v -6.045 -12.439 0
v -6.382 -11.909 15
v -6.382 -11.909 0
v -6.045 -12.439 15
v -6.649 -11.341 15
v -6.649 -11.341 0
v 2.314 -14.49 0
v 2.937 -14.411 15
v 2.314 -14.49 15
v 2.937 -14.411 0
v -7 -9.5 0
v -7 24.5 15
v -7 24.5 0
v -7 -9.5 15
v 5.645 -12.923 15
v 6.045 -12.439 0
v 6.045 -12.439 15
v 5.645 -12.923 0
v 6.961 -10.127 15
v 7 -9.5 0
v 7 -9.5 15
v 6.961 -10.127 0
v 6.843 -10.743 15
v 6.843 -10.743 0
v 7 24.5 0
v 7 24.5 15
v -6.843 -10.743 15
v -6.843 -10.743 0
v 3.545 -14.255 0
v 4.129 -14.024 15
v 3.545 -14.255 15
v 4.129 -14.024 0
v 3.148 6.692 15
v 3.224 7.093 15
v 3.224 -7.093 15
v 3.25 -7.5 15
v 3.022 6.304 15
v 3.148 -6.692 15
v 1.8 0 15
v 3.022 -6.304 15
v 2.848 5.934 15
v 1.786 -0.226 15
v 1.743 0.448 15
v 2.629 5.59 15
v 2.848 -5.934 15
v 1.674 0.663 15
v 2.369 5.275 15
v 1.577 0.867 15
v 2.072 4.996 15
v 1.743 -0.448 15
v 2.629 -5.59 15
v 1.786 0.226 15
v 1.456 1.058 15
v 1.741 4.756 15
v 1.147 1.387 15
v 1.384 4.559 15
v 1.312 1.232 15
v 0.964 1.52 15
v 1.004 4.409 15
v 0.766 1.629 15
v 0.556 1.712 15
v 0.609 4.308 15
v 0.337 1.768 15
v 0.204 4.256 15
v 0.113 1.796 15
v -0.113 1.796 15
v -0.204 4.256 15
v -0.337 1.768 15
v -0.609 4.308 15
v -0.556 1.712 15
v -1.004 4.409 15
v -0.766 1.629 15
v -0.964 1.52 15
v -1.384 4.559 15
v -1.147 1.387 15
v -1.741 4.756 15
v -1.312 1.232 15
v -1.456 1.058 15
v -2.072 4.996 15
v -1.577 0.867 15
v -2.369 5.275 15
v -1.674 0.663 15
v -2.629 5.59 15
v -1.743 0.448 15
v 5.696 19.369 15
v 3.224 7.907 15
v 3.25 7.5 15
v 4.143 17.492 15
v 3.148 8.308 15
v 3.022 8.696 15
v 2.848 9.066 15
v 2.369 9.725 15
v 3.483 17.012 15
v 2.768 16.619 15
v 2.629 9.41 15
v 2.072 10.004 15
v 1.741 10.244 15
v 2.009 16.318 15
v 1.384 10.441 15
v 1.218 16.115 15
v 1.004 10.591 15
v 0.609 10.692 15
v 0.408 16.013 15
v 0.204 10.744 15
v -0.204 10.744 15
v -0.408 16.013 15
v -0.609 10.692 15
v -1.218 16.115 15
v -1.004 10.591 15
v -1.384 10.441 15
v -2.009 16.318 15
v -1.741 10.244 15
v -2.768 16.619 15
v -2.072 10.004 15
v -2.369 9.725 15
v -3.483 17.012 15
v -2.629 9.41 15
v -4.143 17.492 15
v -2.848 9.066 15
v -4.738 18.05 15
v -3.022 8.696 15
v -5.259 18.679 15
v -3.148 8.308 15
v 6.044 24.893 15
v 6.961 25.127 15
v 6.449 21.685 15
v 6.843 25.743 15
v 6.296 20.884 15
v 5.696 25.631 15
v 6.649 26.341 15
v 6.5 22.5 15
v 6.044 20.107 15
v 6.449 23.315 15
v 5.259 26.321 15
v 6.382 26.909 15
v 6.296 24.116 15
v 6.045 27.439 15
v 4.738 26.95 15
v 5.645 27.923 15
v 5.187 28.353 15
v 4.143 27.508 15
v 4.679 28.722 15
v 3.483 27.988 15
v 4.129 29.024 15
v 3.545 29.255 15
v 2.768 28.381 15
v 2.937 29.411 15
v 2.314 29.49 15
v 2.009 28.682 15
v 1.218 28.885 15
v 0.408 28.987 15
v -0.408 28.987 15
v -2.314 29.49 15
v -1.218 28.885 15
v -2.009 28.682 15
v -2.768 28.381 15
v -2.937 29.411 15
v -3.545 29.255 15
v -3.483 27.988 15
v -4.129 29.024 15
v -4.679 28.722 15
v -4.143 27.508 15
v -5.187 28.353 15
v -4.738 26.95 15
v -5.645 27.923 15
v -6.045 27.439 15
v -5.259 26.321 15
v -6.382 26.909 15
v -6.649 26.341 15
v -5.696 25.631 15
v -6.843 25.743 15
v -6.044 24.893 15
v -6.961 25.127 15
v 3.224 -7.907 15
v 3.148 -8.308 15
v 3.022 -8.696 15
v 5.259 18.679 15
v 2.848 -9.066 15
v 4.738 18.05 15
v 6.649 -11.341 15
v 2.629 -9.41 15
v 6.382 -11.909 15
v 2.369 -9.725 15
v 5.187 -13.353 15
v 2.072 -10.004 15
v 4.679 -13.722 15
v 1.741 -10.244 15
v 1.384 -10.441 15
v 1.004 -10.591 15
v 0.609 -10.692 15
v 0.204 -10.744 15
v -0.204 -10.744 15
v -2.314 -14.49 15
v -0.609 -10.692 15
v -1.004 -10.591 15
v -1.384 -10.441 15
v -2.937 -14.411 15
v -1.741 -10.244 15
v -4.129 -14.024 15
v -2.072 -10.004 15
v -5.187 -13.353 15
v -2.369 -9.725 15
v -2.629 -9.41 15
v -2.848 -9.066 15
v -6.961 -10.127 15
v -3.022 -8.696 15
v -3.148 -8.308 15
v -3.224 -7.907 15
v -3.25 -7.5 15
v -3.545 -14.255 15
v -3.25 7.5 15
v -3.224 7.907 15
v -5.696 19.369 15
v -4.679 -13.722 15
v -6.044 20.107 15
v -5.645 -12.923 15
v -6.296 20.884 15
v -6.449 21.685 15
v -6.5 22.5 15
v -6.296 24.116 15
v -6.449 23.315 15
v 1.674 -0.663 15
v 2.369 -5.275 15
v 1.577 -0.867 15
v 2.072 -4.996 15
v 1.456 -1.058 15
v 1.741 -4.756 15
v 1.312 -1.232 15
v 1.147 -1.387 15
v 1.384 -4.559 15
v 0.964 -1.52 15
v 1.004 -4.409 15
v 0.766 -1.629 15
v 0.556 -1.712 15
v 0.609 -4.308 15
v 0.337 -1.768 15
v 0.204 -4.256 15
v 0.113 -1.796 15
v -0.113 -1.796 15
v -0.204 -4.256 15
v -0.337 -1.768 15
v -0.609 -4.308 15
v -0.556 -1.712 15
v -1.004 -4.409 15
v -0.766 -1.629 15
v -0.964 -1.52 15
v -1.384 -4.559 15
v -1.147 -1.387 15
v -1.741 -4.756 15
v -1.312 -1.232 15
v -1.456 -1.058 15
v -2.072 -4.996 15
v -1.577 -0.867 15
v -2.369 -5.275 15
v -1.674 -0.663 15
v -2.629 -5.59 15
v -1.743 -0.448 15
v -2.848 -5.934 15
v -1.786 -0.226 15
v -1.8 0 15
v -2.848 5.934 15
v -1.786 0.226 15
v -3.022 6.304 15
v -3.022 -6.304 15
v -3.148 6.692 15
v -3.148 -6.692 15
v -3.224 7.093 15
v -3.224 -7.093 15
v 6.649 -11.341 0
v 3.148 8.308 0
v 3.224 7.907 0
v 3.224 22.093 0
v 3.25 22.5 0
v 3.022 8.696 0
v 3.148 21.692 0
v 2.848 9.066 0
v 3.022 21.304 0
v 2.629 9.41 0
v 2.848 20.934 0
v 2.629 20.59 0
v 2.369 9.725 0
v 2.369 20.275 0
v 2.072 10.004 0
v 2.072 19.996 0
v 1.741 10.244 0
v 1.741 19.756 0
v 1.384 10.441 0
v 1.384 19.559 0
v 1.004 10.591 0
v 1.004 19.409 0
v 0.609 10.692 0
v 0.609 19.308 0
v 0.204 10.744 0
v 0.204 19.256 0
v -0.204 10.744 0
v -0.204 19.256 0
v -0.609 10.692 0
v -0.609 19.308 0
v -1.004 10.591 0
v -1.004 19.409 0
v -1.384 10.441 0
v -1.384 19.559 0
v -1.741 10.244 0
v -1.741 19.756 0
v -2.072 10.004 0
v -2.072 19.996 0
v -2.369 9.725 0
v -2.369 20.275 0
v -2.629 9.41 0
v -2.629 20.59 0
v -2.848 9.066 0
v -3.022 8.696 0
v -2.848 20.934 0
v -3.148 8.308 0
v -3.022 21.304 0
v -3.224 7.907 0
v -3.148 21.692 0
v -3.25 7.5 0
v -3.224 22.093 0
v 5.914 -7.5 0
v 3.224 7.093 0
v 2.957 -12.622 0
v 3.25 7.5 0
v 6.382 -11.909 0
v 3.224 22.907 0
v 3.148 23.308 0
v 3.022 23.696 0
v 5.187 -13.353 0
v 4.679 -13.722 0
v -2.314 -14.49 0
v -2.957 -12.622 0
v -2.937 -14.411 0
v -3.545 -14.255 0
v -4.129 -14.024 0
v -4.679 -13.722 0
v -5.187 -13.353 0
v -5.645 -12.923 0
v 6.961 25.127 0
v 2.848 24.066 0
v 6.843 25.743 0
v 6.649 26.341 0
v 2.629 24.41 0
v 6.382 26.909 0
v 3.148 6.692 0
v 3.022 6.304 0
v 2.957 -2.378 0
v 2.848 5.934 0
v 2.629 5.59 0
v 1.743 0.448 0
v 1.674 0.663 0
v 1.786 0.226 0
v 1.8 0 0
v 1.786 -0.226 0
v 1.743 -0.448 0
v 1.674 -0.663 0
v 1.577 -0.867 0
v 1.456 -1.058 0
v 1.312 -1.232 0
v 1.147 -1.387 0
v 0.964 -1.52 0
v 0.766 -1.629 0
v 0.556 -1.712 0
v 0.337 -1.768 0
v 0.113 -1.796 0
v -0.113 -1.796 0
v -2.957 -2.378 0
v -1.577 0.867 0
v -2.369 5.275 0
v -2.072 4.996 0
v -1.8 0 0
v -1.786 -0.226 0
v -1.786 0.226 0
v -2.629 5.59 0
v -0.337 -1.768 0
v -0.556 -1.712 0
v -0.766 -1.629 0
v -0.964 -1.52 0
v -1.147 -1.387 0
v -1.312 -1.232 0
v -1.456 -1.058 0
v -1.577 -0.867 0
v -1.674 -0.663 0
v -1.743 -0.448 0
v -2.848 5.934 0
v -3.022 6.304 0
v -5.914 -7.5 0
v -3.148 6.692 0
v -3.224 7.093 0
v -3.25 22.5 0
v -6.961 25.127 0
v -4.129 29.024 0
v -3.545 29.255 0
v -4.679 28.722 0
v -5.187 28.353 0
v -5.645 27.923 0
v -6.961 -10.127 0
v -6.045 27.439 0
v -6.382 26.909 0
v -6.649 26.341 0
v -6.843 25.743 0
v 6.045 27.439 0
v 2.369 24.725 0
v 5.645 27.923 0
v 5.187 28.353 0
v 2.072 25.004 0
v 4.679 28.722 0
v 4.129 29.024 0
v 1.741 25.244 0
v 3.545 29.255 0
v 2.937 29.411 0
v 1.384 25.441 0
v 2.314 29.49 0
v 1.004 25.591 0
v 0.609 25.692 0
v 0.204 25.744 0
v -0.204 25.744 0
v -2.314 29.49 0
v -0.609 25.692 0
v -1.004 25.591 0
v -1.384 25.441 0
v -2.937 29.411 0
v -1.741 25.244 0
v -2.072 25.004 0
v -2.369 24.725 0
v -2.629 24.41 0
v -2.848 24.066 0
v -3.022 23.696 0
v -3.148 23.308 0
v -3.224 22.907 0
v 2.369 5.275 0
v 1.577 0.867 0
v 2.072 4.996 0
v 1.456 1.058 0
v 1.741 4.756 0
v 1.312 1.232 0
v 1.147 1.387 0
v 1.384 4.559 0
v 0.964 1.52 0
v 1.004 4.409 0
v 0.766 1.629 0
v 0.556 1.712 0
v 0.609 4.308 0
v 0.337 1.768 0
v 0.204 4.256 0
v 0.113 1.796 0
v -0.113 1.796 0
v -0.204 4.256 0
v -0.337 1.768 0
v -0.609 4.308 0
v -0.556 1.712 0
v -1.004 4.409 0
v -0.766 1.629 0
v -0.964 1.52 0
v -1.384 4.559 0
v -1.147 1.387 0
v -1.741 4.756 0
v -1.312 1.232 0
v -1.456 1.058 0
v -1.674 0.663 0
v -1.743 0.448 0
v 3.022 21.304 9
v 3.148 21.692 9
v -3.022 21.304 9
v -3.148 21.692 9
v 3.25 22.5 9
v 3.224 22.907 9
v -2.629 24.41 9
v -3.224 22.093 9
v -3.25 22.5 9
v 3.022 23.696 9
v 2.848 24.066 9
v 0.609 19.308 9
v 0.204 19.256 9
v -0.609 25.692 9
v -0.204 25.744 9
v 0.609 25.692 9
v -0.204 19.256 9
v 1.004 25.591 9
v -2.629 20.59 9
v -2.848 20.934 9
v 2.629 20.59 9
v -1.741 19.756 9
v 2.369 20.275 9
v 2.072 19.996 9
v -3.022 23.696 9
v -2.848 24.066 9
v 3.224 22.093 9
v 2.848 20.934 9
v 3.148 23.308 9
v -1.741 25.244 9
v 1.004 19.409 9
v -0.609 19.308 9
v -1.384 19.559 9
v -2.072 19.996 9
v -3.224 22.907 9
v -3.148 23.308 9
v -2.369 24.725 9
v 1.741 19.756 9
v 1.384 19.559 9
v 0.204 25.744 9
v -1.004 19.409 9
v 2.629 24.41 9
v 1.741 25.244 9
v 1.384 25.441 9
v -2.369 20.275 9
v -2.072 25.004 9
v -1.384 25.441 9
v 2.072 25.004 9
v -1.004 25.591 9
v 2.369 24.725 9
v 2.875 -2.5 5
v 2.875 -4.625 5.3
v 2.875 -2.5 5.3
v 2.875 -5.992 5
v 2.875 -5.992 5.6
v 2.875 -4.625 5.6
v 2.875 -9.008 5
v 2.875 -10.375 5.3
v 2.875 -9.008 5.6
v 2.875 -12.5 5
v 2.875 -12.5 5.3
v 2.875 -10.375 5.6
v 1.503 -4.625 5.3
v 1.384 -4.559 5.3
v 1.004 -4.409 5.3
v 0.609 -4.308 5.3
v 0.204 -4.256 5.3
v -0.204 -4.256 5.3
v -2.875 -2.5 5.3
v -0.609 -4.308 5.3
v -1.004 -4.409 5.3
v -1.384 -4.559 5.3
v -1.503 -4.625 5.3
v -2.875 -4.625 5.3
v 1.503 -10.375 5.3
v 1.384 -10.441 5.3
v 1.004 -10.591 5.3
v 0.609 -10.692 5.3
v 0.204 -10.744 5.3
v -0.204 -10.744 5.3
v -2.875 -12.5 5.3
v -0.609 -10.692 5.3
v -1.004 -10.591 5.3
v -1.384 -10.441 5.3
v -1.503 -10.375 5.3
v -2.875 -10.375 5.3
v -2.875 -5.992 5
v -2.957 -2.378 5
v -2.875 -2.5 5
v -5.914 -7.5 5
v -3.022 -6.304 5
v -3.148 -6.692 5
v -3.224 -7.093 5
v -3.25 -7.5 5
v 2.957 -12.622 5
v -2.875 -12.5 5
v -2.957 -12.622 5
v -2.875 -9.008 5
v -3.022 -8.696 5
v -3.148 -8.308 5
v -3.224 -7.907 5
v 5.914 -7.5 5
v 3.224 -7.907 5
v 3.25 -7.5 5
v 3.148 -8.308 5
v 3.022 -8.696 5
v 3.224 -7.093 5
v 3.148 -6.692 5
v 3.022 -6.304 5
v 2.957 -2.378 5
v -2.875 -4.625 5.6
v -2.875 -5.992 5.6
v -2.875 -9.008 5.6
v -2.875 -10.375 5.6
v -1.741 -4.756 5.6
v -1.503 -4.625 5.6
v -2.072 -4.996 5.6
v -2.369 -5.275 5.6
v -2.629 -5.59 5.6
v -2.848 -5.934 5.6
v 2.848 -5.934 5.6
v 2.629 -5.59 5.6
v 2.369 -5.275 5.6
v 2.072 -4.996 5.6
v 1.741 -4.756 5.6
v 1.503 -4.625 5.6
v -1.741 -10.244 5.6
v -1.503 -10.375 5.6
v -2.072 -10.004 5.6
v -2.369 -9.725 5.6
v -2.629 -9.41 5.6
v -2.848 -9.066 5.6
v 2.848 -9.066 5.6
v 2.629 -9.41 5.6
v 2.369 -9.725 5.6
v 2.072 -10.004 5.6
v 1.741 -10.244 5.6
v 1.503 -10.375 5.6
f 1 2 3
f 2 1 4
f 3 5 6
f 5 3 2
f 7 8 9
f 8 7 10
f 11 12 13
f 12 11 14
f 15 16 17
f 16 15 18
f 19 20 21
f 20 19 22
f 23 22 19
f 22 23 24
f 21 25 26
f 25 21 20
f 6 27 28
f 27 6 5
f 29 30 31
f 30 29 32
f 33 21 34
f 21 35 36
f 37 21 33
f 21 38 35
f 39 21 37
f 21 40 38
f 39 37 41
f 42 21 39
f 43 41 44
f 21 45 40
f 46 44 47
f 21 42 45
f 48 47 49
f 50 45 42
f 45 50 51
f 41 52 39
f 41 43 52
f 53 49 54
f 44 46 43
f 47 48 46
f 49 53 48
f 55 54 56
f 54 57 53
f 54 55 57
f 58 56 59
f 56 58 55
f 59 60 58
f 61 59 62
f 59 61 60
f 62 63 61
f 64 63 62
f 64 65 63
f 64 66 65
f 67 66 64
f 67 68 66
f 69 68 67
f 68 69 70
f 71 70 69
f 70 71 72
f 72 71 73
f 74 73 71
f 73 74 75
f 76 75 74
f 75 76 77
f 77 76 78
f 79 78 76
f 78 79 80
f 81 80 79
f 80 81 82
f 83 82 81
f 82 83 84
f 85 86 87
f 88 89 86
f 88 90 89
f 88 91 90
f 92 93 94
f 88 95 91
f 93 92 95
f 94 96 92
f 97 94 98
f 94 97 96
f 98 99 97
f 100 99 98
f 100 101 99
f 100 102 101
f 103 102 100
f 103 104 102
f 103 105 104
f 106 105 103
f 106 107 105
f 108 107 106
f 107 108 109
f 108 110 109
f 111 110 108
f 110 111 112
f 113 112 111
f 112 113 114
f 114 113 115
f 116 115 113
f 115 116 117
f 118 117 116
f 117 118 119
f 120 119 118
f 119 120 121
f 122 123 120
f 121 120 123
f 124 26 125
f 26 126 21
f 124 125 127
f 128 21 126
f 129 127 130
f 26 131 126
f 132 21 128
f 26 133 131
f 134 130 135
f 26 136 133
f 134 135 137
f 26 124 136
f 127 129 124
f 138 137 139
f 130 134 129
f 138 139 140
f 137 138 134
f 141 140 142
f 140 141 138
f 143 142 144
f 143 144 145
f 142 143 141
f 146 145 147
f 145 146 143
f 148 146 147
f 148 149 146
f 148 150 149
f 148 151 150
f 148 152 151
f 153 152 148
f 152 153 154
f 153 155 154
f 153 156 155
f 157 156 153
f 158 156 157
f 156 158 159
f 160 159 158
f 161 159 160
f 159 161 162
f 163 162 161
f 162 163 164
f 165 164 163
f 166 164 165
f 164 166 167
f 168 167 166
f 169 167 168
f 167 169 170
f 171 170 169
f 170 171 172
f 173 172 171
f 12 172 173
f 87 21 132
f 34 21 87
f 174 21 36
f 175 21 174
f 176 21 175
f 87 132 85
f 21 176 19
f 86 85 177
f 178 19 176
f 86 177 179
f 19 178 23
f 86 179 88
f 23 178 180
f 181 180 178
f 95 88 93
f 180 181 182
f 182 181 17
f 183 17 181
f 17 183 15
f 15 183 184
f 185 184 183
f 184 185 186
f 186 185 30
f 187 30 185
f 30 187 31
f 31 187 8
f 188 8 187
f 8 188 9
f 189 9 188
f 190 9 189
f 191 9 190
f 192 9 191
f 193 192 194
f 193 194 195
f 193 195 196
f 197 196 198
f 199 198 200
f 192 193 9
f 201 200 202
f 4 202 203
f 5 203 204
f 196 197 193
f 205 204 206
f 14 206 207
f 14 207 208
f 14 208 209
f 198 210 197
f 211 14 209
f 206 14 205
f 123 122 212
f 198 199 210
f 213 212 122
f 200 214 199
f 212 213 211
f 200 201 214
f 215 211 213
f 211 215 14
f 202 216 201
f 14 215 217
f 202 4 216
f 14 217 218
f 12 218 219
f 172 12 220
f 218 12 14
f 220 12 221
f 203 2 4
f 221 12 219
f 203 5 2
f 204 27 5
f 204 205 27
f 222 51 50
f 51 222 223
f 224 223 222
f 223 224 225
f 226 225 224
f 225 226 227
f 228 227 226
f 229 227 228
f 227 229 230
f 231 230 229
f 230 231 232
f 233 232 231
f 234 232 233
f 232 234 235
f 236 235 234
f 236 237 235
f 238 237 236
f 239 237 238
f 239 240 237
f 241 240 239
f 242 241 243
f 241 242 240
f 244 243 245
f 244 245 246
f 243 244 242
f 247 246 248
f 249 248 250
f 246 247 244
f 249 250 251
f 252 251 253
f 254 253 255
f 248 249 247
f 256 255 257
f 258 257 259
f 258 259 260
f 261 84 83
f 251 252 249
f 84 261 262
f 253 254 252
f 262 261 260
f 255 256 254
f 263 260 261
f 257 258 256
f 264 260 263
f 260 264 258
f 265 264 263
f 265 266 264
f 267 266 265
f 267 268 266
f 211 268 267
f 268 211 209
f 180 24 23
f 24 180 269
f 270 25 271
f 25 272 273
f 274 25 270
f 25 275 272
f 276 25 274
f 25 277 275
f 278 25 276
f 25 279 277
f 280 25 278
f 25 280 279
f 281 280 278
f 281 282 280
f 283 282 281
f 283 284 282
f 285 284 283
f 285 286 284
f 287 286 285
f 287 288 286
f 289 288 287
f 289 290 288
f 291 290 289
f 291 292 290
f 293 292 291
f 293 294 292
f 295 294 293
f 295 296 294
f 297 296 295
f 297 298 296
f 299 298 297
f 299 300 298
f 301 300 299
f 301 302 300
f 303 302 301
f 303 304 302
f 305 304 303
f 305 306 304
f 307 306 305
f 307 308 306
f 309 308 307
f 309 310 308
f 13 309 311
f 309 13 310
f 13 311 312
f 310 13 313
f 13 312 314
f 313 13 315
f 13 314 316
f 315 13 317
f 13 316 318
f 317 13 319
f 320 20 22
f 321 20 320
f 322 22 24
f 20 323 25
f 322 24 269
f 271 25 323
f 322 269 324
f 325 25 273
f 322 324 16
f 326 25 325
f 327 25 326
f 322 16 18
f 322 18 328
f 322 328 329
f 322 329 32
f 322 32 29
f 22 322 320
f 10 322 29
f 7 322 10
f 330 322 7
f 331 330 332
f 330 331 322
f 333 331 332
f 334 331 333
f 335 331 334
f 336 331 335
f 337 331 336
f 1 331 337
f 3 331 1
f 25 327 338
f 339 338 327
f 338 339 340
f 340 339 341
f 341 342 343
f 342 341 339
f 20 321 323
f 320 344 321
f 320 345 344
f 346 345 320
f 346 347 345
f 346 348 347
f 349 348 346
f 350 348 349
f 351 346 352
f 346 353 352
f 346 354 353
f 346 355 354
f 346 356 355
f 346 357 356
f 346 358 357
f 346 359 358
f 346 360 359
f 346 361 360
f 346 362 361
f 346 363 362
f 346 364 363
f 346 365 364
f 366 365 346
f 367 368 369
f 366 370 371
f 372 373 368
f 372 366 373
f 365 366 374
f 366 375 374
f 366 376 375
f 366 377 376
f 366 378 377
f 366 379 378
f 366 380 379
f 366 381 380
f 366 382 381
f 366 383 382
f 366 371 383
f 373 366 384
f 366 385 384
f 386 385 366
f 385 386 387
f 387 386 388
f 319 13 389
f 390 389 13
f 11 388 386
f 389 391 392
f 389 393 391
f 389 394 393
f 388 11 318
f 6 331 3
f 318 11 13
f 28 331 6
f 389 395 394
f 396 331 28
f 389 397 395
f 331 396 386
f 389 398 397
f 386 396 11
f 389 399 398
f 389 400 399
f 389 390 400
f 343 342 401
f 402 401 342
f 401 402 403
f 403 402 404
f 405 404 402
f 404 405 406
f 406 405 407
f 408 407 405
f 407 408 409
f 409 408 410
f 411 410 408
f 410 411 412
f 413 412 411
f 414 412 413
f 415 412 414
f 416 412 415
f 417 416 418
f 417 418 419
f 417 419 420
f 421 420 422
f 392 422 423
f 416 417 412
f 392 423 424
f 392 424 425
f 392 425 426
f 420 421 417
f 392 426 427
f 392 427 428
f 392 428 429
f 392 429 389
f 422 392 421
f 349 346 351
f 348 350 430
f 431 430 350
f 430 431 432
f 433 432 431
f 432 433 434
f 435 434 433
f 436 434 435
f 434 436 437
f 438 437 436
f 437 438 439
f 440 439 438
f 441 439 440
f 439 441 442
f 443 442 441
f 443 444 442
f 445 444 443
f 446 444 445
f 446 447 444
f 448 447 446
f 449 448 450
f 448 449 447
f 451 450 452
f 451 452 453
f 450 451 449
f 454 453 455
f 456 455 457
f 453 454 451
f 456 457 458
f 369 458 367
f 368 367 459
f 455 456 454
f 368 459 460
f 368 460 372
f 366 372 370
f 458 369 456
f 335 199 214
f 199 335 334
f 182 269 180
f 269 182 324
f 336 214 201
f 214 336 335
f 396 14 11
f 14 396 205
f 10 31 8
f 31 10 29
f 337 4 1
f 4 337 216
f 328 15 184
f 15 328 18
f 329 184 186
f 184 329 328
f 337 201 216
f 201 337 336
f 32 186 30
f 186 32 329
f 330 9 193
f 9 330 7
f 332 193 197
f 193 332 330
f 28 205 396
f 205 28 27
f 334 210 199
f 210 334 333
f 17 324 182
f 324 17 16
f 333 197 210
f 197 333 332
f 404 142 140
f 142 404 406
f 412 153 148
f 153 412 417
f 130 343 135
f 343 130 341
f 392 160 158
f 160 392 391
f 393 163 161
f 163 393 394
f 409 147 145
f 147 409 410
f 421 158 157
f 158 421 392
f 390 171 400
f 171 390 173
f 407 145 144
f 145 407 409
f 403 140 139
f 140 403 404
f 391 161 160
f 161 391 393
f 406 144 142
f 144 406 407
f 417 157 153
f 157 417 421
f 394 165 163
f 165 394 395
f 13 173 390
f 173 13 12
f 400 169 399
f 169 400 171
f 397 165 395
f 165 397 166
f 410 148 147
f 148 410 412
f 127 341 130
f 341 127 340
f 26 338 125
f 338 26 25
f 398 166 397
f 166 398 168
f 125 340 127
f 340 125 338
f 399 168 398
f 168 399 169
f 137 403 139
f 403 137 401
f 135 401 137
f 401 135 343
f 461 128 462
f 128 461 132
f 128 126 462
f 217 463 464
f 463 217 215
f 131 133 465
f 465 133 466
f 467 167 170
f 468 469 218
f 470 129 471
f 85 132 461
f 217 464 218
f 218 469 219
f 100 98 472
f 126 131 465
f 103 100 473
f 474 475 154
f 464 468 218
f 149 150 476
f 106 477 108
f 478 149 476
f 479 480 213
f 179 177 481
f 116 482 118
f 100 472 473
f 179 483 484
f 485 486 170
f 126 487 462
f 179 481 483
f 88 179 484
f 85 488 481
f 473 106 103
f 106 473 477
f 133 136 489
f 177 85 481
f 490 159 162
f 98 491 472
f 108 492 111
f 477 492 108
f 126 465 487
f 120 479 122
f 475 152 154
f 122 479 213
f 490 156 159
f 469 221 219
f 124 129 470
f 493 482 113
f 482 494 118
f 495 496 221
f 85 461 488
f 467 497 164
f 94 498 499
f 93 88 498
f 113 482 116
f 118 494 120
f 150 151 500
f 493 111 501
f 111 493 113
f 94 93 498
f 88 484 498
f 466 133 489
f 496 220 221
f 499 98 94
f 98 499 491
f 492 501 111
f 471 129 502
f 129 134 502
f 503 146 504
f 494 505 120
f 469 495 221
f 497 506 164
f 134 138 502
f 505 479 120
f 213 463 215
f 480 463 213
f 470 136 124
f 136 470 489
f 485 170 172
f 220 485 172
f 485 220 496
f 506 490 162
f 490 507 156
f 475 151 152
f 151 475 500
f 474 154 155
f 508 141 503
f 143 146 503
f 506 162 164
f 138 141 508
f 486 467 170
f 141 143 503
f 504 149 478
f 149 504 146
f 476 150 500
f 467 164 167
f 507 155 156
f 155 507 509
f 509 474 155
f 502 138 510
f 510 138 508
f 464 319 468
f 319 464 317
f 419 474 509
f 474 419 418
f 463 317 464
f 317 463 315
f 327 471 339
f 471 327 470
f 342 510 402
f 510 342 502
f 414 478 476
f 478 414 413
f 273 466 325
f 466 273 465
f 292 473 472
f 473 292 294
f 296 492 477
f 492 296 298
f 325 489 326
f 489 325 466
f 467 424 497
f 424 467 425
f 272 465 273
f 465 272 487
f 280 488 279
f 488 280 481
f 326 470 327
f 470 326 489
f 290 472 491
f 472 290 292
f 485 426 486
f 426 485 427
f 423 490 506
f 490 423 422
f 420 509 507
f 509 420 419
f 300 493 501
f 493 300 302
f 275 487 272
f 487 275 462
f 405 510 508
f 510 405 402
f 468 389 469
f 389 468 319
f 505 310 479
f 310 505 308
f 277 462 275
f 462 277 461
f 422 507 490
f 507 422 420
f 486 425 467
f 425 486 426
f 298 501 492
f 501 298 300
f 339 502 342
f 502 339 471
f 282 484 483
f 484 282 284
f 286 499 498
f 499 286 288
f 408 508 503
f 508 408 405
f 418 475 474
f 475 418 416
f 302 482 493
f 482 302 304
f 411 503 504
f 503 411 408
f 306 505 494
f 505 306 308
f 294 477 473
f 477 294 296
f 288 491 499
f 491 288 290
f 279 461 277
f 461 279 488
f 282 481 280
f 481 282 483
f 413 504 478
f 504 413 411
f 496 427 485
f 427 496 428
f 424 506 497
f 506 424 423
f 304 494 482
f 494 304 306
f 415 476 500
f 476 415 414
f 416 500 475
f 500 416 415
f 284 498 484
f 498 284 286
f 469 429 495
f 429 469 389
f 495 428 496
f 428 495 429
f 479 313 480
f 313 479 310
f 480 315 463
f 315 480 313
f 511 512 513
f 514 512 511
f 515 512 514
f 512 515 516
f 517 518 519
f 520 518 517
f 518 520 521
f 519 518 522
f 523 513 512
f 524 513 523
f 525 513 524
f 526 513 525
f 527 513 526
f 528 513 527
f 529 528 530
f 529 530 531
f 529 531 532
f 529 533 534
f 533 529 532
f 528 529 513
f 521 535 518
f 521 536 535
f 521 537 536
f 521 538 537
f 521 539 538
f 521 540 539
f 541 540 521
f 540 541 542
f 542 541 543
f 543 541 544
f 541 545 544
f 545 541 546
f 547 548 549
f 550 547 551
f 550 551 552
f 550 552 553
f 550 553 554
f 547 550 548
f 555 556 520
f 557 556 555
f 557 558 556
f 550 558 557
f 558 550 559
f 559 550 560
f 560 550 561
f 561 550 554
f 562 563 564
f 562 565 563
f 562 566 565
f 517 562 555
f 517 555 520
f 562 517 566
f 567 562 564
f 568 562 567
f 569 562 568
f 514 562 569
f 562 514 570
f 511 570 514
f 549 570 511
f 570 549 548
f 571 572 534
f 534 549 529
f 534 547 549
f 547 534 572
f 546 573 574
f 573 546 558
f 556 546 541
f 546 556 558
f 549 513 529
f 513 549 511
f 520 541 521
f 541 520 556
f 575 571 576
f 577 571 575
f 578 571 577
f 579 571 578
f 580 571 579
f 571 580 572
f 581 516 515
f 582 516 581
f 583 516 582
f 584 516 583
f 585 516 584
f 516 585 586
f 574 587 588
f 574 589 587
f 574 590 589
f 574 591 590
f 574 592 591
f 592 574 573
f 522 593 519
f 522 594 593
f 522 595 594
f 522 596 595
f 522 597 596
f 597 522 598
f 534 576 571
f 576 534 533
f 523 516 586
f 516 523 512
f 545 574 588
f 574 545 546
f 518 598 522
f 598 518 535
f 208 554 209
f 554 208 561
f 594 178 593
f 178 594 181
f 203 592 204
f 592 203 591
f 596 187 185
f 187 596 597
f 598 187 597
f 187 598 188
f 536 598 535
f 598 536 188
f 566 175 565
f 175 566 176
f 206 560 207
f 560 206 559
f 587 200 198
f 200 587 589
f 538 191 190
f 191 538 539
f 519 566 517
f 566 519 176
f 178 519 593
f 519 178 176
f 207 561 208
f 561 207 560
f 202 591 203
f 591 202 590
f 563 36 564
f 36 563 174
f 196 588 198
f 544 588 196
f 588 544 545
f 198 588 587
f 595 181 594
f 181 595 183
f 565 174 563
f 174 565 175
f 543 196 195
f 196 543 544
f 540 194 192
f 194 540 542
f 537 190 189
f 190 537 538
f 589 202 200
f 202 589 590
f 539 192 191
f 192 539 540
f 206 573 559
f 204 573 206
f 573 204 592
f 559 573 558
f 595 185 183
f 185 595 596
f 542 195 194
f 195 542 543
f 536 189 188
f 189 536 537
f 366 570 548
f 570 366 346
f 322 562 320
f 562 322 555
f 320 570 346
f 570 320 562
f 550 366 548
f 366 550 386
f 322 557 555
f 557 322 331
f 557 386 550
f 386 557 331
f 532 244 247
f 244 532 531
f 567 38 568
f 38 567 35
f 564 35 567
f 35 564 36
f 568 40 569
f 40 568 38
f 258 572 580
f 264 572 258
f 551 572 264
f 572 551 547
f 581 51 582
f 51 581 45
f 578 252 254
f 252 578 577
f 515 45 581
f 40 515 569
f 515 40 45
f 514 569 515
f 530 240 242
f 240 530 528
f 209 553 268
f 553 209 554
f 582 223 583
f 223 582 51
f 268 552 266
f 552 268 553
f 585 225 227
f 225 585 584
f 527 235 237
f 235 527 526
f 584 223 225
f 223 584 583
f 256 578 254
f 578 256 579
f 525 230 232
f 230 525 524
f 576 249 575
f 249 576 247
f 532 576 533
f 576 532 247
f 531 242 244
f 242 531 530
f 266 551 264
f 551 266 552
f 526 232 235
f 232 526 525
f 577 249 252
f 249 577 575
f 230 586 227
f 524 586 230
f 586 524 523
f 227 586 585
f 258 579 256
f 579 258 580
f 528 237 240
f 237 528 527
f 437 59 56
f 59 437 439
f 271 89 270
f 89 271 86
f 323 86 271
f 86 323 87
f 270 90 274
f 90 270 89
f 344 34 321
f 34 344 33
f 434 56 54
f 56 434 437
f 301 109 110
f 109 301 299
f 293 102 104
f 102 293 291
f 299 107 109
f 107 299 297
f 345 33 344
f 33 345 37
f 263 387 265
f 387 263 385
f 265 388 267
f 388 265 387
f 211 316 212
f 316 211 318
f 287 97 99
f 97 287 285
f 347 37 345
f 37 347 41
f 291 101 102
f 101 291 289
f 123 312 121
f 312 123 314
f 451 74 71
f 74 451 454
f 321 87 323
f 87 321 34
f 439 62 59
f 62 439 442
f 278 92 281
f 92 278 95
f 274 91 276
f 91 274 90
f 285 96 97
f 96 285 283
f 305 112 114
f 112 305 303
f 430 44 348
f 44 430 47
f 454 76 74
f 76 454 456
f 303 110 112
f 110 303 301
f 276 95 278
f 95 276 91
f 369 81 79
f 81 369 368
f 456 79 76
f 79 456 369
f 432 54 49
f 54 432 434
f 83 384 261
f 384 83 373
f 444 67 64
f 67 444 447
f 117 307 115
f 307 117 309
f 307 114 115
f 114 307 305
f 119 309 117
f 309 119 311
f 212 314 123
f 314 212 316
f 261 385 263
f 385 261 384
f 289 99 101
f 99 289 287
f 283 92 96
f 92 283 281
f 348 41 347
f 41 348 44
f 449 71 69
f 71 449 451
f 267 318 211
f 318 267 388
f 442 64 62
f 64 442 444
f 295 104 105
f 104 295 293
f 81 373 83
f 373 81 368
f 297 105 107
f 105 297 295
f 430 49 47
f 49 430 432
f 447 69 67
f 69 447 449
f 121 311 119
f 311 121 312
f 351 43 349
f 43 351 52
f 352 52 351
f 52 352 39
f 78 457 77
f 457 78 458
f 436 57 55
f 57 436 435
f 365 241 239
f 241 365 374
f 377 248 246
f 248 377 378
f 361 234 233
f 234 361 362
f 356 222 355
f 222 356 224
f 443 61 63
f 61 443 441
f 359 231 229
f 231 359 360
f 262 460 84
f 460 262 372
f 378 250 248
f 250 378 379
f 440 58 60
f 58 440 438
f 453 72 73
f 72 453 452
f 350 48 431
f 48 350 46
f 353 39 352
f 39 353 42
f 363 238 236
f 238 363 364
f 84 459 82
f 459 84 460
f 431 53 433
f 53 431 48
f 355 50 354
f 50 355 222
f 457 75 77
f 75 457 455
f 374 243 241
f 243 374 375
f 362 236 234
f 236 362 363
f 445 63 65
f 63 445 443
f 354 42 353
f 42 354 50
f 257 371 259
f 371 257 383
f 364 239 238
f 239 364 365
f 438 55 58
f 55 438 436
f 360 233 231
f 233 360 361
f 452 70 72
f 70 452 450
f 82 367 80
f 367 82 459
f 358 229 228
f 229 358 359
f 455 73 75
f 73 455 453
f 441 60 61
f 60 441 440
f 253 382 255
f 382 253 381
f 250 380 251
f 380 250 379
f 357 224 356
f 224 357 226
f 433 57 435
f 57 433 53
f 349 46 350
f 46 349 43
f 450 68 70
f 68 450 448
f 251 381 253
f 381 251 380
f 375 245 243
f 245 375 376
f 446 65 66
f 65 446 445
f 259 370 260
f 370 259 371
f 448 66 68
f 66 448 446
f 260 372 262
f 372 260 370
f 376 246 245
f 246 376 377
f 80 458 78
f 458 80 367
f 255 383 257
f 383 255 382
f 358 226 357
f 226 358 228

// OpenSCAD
$fn = 50;


difference() {
	union() {
		hull() {
			translate(v = [-2.0000000000, 9.5000000000, 0]) {
				cylinder(h = 15, r = 5);
			}
			translate(v = [2.0000000000, 9.5000000000, 0]) {
				cylinder(h = 15, r = 5);
			}
			translate(v = [-2.0000000000, -9.5000000000, 0]) {
				cylinder(h = 15, r = 5);
			}
			translate(v = [2.0000000000, -9.5000000000, 0]) {
				cylinder(h = 15, r = 5);
			}
		}
		translate(v = [0.0000000000, 15.0000000000, 0]) {
			hull() {
				translate(v = [-2.0000000000, 9.5000000000, 0]) {
					cylinder(h = 15, r = 5);
				}
				translate(v = [2.0000000000, 9.5000000000, 0]) {
					cylinder(h = 15, r = 5);
				}
				translate(v = [-2.0000000000, -9.5000000000, 0]) {
					cylinder(h = 15, r = 5);
				}
				translate(v = [2.0000000000, -9.5000000000, 0]) {
					cylinder(h = 15, r = 5);
				}
			}
		}
		translate(v = [0.0000000000, 15.0000000000, 0]) {
			hull() {
				translate(v = [-2.0000000000, 9.5000000000, 0]) {
					cylinder(h = 15, r = 5);
				}
				translate(v = [2.0000000000, 9.5000000000, 0]) {
					cylinder(h = 15, r = 5);
				}
				translate(v = [-2.0000000000, -9.5000000000, 0]) {
					cylinder(h = 15, r = 5);
				}
				translate(v = [2.0000000000, -9.5000000000, 0]) {
					cylinder(h = 15, r = 5);
				}
			}
		}
	}
	union() {
		translate(v = [0.0000000000, 22.5000000000, 15]) {
			rotate(a = [0, 0, 0]) {
				difference() {
					union() {
						#translate(v = [0, 0, -15.0000000000]) {
							cylinder(h = 15, r = 2.2500000000);
						}
						#translate(v = [0, 0, -6]) {
							cylinder(h = 6, r1 = 3.2500000000, r2 = 6.5000000000);
						}
						#translate(v = [0, 0, -15.0000000000]) {
							cylinder(h = 15, r = 3.2500000000);
						}
						#translate(v = [0, 0, -15.0000000000]) {
							cylinder(h = 15, r = 2.2500000000);
						}
					}
					union();
				}
			}
		}
		translate(v = [0.0000000000, 22.5000000000, 15]) {
			rotate(a = [0, 0, 0]) {
				difference() {
					union() {
						#translate(v = [0, 0, -15.0000000000]) {
							cylinder(h = 15, r = 2.2500000000);
						}
						#translate(v = [0, 0, -6]) {
							cylinder(h = 6, r1 = 3.2500000000, r2 = 6.5000000000);
						}
						#translate(v = [0, 0, -15.0000000000]) {
							cylinder(h = 15, r = 3.2500000000);
						}
						#translate(v = [0, 0, -15.0000000000]) {
							cylinder(h = 15, r = 2.2500000000);
						}
					}
					union();
				}
			}
		}
		translate(v = [0.0000000000, -7.5000000000, 0]) {
			rotate(a = [0, 0, 0]) {
				difference() {
					union() {
						#translate(v = [-2.8750000000, -5.0000000000, -0.3000000000]) {
							cube(size = [5.7500000000, 10, 0.3000000000]);
						}
						#translate(v = [-2.8750000000, -2.8750000000, -0.6000000000]) {
							cube(size = [5.7500000000, 5.7500000000, 0.3000000000]);
						}
						#translate(v = [-2.8750000000, -5.0000000000, 5]) {
							cube(size = [5.7500000000, 10, 0.3000000000]);
						}
						#translate(v = [-2.8750000000, -2.8750000000, 5.3000000000]) {
							cube(size = [5.7500000000, 5.7500000000, 0.3000000000]);
						}
						#translate(v = [0, 0, -100.0000000000]) {
							cylinder(h = 200, r = 3.2500000000);
						}
						#linear_extrude(height = 5) {
							polygon(points = [[5.9142500000, 0.0000000000], [2.9571250000, 5.1218907443], [-2.9571250000, 5.1218907443], [-5.9142500000, 0.0000000000], [-2.9571250000, -5.1218907443], [2.9571250000, -5.1218907443]]);
						}
						#translate(v = [-2.8750000000, -5.0000000000, -0.3000000000]) {
							cube(size = [5.7500000000, 10, 0.3000000000]);
						}
						#translate(v = [-2.8750000000, -2.8750000000, -0.6000000000]) {
							cube(size = [5.7500000000, 5.7500000000, 0.3000000000]);
						}
						#translate(v = [-2.8750000000, -5.0000000000, 5]) {
							cube(size = [5.7500000000, 10, 0.3000000000]);
						}
						#translate(v = [-2.8750000000, -2.8750000000, 5.3000000000]) {
							cube(size = [5.7500000000, 5.7500000000, 0.3000000000]);
						}
						#translate(v = [0, 0, -100.0000000000]) {
							cylinder(h = 200, r = 3.2500000000);
						}
						#translate(v = [-2.8750000000, -5.0000000000, -0.3000000000]) {
							cube(size = [5.7500000000, 10, 0.3000000000]);
						}
						#translate(v = [-2.8750000000, -2.8750000000, -0.6000000000]) {
							cube(size = [5.7500000000, 5.7500000000, 0.3000000000]);
						}
						#translate(v = [-2.8750000000, -5.0000000000, 5]) {
							cube(size = [5.7500000000, 10, 0.3000000000]);
						}
						#translate(v = [-2.8750000000, -2.8750000000, 5.3000000000]) {
							cube(size = [5.7500000000, 5.7500000000, 0.3000000000]);
						}
						#translate(v = [0, 0, -100.0000000000]) {
							cylinder(h = 200, r = 3.2500000000);
						}
					}
					union();
				}
			}
		}
		translate(v = [0.0000000000, -7.5000000000, 0]) {
			translate(v = [0, 0, -100]) {
				cylinder(h = 200, r = 3.2500000000);
			}
		}
		translate(v = [0.0000000000, 7.5000000000, 0]) {
			translate(v = [0, 0, -100]) {
				cylinder(h = 200, r = 3.2500000000);
			}
		}
		translate(v = [0.0000000000, -7.5000000000, 0]) {
			translate(v = [0, 0, -100]) {
				cylinder(h = 200, r = 1.8000000000);
			}
		}
		translate(v = [0, 0, -100]) {
			cylinder(h = 200, r = 1.8000000000);
		}
		translate(v = [0.0000000000, 7.5000000000, 0]) {
			translate(v = [0, 0, -100]) {
				cylinder(h = 200, r = 1.8000000000);
			}
		}
	}
}
